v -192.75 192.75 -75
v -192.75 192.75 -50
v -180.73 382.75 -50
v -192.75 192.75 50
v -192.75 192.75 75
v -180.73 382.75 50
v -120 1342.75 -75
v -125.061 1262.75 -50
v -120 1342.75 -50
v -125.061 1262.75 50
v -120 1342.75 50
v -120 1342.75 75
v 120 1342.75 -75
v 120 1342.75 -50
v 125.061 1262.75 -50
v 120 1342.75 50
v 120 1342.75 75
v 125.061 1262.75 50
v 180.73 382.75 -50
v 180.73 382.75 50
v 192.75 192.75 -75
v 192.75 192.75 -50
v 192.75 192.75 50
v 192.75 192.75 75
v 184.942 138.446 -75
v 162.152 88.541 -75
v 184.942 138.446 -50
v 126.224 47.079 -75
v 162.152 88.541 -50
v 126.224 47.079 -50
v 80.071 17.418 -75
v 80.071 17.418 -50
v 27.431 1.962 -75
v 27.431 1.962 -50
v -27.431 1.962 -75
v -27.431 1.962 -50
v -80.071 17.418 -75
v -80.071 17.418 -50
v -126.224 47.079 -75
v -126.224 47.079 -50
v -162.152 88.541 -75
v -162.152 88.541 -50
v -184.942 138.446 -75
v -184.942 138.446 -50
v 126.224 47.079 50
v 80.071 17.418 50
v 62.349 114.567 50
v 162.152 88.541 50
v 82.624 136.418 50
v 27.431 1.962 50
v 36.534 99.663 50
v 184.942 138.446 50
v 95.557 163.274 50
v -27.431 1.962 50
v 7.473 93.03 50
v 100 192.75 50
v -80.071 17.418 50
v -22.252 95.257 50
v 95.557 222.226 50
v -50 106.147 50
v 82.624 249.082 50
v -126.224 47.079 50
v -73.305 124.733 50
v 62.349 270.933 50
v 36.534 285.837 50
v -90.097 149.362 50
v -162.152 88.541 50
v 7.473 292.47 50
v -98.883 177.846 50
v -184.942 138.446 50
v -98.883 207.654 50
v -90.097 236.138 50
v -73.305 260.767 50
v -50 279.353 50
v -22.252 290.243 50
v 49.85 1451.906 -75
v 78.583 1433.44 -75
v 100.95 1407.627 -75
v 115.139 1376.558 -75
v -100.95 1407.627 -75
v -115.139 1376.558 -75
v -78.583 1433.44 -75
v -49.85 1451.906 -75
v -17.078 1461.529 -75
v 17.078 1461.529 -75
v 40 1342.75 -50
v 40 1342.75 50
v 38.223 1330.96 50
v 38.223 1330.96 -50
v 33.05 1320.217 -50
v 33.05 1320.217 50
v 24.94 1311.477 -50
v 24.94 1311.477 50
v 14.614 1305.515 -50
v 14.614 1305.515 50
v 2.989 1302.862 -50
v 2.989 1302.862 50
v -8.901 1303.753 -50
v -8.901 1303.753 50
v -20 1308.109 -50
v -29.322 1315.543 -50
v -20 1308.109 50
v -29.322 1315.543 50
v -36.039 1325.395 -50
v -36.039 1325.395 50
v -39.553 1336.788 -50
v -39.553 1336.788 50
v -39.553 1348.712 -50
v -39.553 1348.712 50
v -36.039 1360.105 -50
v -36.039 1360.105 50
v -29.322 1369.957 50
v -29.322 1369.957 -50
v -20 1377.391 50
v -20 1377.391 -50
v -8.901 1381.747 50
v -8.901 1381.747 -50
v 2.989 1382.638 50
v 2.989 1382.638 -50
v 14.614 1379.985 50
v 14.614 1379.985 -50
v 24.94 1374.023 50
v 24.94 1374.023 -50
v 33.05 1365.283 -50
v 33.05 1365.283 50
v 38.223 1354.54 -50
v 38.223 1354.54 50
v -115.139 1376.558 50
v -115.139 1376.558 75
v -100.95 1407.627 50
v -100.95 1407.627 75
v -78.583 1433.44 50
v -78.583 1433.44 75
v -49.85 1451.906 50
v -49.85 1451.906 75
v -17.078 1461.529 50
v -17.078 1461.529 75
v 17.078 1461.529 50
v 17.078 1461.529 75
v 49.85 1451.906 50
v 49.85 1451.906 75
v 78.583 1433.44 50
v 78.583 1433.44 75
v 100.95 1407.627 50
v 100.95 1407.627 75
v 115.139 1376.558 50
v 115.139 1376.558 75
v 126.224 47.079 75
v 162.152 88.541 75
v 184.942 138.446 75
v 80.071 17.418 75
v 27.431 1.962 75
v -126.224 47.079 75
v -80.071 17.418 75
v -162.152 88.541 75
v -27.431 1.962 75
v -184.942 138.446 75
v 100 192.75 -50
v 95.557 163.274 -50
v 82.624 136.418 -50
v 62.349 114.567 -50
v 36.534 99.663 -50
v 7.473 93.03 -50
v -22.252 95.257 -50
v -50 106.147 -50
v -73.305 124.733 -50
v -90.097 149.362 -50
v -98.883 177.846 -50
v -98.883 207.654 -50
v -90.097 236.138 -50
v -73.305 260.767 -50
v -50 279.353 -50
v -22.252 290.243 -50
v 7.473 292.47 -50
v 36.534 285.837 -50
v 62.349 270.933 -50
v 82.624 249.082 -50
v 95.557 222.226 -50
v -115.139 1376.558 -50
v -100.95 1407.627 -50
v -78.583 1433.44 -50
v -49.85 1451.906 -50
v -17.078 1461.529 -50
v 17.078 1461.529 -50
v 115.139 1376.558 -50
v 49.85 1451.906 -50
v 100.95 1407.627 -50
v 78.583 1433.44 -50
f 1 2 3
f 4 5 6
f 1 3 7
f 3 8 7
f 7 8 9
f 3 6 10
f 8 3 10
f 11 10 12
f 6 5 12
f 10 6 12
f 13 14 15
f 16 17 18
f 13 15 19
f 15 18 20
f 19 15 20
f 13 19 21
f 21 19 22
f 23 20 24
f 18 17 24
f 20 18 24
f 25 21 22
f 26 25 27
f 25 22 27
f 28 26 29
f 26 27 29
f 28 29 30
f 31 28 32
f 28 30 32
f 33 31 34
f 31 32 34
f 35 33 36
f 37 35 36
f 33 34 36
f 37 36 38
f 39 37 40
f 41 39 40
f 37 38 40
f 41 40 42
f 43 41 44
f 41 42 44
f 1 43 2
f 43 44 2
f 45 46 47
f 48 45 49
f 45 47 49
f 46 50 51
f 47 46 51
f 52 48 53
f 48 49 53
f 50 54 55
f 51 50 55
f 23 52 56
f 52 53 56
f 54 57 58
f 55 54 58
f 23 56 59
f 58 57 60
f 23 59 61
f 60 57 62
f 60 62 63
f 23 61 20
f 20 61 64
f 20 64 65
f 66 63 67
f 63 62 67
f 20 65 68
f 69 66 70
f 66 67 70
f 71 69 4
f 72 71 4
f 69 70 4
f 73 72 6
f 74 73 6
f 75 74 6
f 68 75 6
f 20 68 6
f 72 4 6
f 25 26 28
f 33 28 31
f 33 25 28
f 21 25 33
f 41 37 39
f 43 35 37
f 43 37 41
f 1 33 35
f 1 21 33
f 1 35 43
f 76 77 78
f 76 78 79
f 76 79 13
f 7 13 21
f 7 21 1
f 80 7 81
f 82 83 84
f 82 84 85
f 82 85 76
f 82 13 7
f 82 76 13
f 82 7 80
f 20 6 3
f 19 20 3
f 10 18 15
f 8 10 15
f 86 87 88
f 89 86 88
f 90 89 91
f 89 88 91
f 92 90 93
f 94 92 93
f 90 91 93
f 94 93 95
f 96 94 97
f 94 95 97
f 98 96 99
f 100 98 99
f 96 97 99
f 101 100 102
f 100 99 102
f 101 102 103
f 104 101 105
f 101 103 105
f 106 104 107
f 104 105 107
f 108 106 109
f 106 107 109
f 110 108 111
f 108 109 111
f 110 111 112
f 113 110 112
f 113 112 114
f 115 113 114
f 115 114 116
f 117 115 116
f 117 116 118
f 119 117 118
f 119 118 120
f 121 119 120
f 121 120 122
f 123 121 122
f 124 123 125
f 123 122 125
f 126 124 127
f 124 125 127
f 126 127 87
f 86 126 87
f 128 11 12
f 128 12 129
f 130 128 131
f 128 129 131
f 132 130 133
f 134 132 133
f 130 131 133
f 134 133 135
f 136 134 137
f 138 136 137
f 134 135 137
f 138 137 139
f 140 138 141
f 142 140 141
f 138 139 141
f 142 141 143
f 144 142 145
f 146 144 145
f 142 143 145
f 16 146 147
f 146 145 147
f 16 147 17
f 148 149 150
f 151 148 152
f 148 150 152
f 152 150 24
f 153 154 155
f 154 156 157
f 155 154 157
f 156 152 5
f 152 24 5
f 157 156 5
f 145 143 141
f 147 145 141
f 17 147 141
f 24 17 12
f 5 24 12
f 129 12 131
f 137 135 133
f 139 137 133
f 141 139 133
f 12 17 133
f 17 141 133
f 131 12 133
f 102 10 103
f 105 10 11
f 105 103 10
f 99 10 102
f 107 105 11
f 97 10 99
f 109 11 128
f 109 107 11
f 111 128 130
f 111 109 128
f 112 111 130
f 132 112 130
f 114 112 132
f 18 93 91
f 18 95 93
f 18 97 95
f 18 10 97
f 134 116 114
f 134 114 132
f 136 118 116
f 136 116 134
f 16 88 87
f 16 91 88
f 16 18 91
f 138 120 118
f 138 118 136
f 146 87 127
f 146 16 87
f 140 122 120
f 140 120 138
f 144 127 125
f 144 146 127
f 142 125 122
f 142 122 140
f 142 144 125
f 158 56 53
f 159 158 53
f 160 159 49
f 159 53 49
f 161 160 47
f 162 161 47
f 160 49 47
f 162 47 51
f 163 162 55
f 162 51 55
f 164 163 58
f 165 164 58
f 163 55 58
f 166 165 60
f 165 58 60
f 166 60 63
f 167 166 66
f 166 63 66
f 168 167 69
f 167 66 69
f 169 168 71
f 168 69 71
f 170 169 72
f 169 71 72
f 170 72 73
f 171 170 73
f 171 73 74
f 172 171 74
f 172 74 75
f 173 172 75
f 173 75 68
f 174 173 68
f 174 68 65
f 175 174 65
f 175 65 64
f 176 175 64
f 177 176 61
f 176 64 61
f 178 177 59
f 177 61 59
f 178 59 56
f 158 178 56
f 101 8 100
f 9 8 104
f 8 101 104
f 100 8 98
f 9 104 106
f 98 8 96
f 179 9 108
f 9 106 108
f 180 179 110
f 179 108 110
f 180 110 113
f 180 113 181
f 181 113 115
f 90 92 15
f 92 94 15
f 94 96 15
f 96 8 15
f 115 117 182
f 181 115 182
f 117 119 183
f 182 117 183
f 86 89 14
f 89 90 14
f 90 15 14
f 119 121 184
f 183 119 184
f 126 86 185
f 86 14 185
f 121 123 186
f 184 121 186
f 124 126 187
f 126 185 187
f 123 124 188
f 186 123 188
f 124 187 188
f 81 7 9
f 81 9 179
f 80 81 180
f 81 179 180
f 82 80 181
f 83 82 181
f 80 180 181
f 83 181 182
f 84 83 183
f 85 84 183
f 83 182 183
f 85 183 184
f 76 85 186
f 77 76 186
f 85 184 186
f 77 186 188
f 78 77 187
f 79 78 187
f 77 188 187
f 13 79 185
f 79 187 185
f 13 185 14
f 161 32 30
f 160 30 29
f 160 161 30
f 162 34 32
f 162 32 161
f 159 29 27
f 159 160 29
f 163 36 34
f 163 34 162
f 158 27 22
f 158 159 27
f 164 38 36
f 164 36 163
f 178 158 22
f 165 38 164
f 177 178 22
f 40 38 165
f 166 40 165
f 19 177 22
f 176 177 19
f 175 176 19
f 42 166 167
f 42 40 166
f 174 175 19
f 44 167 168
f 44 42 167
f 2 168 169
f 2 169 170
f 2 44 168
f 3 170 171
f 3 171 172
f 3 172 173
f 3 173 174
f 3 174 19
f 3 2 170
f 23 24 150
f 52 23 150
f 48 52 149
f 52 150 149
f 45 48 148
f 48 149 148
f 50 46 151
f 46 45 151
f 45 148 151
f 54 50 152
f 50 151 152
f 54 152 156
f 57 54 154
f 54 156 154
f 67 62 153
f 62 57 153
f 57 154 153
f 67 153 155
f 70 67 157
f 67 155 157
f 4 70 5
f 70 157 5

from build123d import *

# Parameters (mm, degrees)
BOSS_EXTRUDE1_DEPTH = 75
SKETCH3_W           = 100
SKETCH3_H           = 382.75
SKETCH3_H_2         = 200
CUT_EXTRUDE1_DEPTH  = 195
SKETCH5_R           = 40
BOSS_EXTRUDE2_DEPTH = 100
SKETCH4_R           = 100
BOSS_EXTRUDE3_DEPTH = 100


with BuildPart() as part:
    # Sketch2 → Boss-Extrude1 (new, symmetric)
    with BuildSketch(Plane.XY):
        with BuildLine():
            Line((120, 1342.75), (192.75, 192.75))
            ThreePointArc((192.75, 192.75), (0, 0), (-192.75, 192.75))
            Line((-192.75, 192.75), (-120, 1342.75))
            ThreePointArc((-120, 1342.75), (0, 1462.75), (120, 1342.75))
        make_face()
    extrude(amount=BOSS_EXTRUDE1_DEPTH, both=True)

    # Sketch3 → Cut-Extrude1 (cut, symmetric)
    with BuildSketch(Plane(origin=(0, 0, 0), x_dir=(0, 0, -1), z_dir=(1, 0, 0))):
        with Locations((0, 191.375)):
            Rectangle(SKETCH3_W, SKETCH3_H)
        with Locations((0, 1362.75)):
            Rectangle(SKETCH3_W, SKETCH3_H_2)
    extrude(amount=CUT_EXTRUDE1_DEPTH, both=True, mode=Mode.SUBTRACT)

    # Sketch5 → Boss-Extrude2 (add)
    with BuildSketch(Plane(origin=(0, 0, 50), x_dir=(-1, 0, 0), z_dir=(0, 0, -1))):
        with Locations(Location((0, 1342.75, 0), (0, 0, 180))):
            Circle(SKETCH5_R)
    extrude(amount=BOSS_EXTRUDE2_DEPTH)

    # Sketch4 → Boss-Extrude3 (add)
    with BuildSketch(Plane(origin=(0, 0, 50), x_dir=(-1, 0, 0), z_dir=(0, 0, -1))):
        with Locations(Location((0, 192.75, 0), (0, 0, 180))):
            Circle(SKETCH4_R)
    extrude(amount=BOSS_EXTRUDE3_DEPTH)


solid = part.part
